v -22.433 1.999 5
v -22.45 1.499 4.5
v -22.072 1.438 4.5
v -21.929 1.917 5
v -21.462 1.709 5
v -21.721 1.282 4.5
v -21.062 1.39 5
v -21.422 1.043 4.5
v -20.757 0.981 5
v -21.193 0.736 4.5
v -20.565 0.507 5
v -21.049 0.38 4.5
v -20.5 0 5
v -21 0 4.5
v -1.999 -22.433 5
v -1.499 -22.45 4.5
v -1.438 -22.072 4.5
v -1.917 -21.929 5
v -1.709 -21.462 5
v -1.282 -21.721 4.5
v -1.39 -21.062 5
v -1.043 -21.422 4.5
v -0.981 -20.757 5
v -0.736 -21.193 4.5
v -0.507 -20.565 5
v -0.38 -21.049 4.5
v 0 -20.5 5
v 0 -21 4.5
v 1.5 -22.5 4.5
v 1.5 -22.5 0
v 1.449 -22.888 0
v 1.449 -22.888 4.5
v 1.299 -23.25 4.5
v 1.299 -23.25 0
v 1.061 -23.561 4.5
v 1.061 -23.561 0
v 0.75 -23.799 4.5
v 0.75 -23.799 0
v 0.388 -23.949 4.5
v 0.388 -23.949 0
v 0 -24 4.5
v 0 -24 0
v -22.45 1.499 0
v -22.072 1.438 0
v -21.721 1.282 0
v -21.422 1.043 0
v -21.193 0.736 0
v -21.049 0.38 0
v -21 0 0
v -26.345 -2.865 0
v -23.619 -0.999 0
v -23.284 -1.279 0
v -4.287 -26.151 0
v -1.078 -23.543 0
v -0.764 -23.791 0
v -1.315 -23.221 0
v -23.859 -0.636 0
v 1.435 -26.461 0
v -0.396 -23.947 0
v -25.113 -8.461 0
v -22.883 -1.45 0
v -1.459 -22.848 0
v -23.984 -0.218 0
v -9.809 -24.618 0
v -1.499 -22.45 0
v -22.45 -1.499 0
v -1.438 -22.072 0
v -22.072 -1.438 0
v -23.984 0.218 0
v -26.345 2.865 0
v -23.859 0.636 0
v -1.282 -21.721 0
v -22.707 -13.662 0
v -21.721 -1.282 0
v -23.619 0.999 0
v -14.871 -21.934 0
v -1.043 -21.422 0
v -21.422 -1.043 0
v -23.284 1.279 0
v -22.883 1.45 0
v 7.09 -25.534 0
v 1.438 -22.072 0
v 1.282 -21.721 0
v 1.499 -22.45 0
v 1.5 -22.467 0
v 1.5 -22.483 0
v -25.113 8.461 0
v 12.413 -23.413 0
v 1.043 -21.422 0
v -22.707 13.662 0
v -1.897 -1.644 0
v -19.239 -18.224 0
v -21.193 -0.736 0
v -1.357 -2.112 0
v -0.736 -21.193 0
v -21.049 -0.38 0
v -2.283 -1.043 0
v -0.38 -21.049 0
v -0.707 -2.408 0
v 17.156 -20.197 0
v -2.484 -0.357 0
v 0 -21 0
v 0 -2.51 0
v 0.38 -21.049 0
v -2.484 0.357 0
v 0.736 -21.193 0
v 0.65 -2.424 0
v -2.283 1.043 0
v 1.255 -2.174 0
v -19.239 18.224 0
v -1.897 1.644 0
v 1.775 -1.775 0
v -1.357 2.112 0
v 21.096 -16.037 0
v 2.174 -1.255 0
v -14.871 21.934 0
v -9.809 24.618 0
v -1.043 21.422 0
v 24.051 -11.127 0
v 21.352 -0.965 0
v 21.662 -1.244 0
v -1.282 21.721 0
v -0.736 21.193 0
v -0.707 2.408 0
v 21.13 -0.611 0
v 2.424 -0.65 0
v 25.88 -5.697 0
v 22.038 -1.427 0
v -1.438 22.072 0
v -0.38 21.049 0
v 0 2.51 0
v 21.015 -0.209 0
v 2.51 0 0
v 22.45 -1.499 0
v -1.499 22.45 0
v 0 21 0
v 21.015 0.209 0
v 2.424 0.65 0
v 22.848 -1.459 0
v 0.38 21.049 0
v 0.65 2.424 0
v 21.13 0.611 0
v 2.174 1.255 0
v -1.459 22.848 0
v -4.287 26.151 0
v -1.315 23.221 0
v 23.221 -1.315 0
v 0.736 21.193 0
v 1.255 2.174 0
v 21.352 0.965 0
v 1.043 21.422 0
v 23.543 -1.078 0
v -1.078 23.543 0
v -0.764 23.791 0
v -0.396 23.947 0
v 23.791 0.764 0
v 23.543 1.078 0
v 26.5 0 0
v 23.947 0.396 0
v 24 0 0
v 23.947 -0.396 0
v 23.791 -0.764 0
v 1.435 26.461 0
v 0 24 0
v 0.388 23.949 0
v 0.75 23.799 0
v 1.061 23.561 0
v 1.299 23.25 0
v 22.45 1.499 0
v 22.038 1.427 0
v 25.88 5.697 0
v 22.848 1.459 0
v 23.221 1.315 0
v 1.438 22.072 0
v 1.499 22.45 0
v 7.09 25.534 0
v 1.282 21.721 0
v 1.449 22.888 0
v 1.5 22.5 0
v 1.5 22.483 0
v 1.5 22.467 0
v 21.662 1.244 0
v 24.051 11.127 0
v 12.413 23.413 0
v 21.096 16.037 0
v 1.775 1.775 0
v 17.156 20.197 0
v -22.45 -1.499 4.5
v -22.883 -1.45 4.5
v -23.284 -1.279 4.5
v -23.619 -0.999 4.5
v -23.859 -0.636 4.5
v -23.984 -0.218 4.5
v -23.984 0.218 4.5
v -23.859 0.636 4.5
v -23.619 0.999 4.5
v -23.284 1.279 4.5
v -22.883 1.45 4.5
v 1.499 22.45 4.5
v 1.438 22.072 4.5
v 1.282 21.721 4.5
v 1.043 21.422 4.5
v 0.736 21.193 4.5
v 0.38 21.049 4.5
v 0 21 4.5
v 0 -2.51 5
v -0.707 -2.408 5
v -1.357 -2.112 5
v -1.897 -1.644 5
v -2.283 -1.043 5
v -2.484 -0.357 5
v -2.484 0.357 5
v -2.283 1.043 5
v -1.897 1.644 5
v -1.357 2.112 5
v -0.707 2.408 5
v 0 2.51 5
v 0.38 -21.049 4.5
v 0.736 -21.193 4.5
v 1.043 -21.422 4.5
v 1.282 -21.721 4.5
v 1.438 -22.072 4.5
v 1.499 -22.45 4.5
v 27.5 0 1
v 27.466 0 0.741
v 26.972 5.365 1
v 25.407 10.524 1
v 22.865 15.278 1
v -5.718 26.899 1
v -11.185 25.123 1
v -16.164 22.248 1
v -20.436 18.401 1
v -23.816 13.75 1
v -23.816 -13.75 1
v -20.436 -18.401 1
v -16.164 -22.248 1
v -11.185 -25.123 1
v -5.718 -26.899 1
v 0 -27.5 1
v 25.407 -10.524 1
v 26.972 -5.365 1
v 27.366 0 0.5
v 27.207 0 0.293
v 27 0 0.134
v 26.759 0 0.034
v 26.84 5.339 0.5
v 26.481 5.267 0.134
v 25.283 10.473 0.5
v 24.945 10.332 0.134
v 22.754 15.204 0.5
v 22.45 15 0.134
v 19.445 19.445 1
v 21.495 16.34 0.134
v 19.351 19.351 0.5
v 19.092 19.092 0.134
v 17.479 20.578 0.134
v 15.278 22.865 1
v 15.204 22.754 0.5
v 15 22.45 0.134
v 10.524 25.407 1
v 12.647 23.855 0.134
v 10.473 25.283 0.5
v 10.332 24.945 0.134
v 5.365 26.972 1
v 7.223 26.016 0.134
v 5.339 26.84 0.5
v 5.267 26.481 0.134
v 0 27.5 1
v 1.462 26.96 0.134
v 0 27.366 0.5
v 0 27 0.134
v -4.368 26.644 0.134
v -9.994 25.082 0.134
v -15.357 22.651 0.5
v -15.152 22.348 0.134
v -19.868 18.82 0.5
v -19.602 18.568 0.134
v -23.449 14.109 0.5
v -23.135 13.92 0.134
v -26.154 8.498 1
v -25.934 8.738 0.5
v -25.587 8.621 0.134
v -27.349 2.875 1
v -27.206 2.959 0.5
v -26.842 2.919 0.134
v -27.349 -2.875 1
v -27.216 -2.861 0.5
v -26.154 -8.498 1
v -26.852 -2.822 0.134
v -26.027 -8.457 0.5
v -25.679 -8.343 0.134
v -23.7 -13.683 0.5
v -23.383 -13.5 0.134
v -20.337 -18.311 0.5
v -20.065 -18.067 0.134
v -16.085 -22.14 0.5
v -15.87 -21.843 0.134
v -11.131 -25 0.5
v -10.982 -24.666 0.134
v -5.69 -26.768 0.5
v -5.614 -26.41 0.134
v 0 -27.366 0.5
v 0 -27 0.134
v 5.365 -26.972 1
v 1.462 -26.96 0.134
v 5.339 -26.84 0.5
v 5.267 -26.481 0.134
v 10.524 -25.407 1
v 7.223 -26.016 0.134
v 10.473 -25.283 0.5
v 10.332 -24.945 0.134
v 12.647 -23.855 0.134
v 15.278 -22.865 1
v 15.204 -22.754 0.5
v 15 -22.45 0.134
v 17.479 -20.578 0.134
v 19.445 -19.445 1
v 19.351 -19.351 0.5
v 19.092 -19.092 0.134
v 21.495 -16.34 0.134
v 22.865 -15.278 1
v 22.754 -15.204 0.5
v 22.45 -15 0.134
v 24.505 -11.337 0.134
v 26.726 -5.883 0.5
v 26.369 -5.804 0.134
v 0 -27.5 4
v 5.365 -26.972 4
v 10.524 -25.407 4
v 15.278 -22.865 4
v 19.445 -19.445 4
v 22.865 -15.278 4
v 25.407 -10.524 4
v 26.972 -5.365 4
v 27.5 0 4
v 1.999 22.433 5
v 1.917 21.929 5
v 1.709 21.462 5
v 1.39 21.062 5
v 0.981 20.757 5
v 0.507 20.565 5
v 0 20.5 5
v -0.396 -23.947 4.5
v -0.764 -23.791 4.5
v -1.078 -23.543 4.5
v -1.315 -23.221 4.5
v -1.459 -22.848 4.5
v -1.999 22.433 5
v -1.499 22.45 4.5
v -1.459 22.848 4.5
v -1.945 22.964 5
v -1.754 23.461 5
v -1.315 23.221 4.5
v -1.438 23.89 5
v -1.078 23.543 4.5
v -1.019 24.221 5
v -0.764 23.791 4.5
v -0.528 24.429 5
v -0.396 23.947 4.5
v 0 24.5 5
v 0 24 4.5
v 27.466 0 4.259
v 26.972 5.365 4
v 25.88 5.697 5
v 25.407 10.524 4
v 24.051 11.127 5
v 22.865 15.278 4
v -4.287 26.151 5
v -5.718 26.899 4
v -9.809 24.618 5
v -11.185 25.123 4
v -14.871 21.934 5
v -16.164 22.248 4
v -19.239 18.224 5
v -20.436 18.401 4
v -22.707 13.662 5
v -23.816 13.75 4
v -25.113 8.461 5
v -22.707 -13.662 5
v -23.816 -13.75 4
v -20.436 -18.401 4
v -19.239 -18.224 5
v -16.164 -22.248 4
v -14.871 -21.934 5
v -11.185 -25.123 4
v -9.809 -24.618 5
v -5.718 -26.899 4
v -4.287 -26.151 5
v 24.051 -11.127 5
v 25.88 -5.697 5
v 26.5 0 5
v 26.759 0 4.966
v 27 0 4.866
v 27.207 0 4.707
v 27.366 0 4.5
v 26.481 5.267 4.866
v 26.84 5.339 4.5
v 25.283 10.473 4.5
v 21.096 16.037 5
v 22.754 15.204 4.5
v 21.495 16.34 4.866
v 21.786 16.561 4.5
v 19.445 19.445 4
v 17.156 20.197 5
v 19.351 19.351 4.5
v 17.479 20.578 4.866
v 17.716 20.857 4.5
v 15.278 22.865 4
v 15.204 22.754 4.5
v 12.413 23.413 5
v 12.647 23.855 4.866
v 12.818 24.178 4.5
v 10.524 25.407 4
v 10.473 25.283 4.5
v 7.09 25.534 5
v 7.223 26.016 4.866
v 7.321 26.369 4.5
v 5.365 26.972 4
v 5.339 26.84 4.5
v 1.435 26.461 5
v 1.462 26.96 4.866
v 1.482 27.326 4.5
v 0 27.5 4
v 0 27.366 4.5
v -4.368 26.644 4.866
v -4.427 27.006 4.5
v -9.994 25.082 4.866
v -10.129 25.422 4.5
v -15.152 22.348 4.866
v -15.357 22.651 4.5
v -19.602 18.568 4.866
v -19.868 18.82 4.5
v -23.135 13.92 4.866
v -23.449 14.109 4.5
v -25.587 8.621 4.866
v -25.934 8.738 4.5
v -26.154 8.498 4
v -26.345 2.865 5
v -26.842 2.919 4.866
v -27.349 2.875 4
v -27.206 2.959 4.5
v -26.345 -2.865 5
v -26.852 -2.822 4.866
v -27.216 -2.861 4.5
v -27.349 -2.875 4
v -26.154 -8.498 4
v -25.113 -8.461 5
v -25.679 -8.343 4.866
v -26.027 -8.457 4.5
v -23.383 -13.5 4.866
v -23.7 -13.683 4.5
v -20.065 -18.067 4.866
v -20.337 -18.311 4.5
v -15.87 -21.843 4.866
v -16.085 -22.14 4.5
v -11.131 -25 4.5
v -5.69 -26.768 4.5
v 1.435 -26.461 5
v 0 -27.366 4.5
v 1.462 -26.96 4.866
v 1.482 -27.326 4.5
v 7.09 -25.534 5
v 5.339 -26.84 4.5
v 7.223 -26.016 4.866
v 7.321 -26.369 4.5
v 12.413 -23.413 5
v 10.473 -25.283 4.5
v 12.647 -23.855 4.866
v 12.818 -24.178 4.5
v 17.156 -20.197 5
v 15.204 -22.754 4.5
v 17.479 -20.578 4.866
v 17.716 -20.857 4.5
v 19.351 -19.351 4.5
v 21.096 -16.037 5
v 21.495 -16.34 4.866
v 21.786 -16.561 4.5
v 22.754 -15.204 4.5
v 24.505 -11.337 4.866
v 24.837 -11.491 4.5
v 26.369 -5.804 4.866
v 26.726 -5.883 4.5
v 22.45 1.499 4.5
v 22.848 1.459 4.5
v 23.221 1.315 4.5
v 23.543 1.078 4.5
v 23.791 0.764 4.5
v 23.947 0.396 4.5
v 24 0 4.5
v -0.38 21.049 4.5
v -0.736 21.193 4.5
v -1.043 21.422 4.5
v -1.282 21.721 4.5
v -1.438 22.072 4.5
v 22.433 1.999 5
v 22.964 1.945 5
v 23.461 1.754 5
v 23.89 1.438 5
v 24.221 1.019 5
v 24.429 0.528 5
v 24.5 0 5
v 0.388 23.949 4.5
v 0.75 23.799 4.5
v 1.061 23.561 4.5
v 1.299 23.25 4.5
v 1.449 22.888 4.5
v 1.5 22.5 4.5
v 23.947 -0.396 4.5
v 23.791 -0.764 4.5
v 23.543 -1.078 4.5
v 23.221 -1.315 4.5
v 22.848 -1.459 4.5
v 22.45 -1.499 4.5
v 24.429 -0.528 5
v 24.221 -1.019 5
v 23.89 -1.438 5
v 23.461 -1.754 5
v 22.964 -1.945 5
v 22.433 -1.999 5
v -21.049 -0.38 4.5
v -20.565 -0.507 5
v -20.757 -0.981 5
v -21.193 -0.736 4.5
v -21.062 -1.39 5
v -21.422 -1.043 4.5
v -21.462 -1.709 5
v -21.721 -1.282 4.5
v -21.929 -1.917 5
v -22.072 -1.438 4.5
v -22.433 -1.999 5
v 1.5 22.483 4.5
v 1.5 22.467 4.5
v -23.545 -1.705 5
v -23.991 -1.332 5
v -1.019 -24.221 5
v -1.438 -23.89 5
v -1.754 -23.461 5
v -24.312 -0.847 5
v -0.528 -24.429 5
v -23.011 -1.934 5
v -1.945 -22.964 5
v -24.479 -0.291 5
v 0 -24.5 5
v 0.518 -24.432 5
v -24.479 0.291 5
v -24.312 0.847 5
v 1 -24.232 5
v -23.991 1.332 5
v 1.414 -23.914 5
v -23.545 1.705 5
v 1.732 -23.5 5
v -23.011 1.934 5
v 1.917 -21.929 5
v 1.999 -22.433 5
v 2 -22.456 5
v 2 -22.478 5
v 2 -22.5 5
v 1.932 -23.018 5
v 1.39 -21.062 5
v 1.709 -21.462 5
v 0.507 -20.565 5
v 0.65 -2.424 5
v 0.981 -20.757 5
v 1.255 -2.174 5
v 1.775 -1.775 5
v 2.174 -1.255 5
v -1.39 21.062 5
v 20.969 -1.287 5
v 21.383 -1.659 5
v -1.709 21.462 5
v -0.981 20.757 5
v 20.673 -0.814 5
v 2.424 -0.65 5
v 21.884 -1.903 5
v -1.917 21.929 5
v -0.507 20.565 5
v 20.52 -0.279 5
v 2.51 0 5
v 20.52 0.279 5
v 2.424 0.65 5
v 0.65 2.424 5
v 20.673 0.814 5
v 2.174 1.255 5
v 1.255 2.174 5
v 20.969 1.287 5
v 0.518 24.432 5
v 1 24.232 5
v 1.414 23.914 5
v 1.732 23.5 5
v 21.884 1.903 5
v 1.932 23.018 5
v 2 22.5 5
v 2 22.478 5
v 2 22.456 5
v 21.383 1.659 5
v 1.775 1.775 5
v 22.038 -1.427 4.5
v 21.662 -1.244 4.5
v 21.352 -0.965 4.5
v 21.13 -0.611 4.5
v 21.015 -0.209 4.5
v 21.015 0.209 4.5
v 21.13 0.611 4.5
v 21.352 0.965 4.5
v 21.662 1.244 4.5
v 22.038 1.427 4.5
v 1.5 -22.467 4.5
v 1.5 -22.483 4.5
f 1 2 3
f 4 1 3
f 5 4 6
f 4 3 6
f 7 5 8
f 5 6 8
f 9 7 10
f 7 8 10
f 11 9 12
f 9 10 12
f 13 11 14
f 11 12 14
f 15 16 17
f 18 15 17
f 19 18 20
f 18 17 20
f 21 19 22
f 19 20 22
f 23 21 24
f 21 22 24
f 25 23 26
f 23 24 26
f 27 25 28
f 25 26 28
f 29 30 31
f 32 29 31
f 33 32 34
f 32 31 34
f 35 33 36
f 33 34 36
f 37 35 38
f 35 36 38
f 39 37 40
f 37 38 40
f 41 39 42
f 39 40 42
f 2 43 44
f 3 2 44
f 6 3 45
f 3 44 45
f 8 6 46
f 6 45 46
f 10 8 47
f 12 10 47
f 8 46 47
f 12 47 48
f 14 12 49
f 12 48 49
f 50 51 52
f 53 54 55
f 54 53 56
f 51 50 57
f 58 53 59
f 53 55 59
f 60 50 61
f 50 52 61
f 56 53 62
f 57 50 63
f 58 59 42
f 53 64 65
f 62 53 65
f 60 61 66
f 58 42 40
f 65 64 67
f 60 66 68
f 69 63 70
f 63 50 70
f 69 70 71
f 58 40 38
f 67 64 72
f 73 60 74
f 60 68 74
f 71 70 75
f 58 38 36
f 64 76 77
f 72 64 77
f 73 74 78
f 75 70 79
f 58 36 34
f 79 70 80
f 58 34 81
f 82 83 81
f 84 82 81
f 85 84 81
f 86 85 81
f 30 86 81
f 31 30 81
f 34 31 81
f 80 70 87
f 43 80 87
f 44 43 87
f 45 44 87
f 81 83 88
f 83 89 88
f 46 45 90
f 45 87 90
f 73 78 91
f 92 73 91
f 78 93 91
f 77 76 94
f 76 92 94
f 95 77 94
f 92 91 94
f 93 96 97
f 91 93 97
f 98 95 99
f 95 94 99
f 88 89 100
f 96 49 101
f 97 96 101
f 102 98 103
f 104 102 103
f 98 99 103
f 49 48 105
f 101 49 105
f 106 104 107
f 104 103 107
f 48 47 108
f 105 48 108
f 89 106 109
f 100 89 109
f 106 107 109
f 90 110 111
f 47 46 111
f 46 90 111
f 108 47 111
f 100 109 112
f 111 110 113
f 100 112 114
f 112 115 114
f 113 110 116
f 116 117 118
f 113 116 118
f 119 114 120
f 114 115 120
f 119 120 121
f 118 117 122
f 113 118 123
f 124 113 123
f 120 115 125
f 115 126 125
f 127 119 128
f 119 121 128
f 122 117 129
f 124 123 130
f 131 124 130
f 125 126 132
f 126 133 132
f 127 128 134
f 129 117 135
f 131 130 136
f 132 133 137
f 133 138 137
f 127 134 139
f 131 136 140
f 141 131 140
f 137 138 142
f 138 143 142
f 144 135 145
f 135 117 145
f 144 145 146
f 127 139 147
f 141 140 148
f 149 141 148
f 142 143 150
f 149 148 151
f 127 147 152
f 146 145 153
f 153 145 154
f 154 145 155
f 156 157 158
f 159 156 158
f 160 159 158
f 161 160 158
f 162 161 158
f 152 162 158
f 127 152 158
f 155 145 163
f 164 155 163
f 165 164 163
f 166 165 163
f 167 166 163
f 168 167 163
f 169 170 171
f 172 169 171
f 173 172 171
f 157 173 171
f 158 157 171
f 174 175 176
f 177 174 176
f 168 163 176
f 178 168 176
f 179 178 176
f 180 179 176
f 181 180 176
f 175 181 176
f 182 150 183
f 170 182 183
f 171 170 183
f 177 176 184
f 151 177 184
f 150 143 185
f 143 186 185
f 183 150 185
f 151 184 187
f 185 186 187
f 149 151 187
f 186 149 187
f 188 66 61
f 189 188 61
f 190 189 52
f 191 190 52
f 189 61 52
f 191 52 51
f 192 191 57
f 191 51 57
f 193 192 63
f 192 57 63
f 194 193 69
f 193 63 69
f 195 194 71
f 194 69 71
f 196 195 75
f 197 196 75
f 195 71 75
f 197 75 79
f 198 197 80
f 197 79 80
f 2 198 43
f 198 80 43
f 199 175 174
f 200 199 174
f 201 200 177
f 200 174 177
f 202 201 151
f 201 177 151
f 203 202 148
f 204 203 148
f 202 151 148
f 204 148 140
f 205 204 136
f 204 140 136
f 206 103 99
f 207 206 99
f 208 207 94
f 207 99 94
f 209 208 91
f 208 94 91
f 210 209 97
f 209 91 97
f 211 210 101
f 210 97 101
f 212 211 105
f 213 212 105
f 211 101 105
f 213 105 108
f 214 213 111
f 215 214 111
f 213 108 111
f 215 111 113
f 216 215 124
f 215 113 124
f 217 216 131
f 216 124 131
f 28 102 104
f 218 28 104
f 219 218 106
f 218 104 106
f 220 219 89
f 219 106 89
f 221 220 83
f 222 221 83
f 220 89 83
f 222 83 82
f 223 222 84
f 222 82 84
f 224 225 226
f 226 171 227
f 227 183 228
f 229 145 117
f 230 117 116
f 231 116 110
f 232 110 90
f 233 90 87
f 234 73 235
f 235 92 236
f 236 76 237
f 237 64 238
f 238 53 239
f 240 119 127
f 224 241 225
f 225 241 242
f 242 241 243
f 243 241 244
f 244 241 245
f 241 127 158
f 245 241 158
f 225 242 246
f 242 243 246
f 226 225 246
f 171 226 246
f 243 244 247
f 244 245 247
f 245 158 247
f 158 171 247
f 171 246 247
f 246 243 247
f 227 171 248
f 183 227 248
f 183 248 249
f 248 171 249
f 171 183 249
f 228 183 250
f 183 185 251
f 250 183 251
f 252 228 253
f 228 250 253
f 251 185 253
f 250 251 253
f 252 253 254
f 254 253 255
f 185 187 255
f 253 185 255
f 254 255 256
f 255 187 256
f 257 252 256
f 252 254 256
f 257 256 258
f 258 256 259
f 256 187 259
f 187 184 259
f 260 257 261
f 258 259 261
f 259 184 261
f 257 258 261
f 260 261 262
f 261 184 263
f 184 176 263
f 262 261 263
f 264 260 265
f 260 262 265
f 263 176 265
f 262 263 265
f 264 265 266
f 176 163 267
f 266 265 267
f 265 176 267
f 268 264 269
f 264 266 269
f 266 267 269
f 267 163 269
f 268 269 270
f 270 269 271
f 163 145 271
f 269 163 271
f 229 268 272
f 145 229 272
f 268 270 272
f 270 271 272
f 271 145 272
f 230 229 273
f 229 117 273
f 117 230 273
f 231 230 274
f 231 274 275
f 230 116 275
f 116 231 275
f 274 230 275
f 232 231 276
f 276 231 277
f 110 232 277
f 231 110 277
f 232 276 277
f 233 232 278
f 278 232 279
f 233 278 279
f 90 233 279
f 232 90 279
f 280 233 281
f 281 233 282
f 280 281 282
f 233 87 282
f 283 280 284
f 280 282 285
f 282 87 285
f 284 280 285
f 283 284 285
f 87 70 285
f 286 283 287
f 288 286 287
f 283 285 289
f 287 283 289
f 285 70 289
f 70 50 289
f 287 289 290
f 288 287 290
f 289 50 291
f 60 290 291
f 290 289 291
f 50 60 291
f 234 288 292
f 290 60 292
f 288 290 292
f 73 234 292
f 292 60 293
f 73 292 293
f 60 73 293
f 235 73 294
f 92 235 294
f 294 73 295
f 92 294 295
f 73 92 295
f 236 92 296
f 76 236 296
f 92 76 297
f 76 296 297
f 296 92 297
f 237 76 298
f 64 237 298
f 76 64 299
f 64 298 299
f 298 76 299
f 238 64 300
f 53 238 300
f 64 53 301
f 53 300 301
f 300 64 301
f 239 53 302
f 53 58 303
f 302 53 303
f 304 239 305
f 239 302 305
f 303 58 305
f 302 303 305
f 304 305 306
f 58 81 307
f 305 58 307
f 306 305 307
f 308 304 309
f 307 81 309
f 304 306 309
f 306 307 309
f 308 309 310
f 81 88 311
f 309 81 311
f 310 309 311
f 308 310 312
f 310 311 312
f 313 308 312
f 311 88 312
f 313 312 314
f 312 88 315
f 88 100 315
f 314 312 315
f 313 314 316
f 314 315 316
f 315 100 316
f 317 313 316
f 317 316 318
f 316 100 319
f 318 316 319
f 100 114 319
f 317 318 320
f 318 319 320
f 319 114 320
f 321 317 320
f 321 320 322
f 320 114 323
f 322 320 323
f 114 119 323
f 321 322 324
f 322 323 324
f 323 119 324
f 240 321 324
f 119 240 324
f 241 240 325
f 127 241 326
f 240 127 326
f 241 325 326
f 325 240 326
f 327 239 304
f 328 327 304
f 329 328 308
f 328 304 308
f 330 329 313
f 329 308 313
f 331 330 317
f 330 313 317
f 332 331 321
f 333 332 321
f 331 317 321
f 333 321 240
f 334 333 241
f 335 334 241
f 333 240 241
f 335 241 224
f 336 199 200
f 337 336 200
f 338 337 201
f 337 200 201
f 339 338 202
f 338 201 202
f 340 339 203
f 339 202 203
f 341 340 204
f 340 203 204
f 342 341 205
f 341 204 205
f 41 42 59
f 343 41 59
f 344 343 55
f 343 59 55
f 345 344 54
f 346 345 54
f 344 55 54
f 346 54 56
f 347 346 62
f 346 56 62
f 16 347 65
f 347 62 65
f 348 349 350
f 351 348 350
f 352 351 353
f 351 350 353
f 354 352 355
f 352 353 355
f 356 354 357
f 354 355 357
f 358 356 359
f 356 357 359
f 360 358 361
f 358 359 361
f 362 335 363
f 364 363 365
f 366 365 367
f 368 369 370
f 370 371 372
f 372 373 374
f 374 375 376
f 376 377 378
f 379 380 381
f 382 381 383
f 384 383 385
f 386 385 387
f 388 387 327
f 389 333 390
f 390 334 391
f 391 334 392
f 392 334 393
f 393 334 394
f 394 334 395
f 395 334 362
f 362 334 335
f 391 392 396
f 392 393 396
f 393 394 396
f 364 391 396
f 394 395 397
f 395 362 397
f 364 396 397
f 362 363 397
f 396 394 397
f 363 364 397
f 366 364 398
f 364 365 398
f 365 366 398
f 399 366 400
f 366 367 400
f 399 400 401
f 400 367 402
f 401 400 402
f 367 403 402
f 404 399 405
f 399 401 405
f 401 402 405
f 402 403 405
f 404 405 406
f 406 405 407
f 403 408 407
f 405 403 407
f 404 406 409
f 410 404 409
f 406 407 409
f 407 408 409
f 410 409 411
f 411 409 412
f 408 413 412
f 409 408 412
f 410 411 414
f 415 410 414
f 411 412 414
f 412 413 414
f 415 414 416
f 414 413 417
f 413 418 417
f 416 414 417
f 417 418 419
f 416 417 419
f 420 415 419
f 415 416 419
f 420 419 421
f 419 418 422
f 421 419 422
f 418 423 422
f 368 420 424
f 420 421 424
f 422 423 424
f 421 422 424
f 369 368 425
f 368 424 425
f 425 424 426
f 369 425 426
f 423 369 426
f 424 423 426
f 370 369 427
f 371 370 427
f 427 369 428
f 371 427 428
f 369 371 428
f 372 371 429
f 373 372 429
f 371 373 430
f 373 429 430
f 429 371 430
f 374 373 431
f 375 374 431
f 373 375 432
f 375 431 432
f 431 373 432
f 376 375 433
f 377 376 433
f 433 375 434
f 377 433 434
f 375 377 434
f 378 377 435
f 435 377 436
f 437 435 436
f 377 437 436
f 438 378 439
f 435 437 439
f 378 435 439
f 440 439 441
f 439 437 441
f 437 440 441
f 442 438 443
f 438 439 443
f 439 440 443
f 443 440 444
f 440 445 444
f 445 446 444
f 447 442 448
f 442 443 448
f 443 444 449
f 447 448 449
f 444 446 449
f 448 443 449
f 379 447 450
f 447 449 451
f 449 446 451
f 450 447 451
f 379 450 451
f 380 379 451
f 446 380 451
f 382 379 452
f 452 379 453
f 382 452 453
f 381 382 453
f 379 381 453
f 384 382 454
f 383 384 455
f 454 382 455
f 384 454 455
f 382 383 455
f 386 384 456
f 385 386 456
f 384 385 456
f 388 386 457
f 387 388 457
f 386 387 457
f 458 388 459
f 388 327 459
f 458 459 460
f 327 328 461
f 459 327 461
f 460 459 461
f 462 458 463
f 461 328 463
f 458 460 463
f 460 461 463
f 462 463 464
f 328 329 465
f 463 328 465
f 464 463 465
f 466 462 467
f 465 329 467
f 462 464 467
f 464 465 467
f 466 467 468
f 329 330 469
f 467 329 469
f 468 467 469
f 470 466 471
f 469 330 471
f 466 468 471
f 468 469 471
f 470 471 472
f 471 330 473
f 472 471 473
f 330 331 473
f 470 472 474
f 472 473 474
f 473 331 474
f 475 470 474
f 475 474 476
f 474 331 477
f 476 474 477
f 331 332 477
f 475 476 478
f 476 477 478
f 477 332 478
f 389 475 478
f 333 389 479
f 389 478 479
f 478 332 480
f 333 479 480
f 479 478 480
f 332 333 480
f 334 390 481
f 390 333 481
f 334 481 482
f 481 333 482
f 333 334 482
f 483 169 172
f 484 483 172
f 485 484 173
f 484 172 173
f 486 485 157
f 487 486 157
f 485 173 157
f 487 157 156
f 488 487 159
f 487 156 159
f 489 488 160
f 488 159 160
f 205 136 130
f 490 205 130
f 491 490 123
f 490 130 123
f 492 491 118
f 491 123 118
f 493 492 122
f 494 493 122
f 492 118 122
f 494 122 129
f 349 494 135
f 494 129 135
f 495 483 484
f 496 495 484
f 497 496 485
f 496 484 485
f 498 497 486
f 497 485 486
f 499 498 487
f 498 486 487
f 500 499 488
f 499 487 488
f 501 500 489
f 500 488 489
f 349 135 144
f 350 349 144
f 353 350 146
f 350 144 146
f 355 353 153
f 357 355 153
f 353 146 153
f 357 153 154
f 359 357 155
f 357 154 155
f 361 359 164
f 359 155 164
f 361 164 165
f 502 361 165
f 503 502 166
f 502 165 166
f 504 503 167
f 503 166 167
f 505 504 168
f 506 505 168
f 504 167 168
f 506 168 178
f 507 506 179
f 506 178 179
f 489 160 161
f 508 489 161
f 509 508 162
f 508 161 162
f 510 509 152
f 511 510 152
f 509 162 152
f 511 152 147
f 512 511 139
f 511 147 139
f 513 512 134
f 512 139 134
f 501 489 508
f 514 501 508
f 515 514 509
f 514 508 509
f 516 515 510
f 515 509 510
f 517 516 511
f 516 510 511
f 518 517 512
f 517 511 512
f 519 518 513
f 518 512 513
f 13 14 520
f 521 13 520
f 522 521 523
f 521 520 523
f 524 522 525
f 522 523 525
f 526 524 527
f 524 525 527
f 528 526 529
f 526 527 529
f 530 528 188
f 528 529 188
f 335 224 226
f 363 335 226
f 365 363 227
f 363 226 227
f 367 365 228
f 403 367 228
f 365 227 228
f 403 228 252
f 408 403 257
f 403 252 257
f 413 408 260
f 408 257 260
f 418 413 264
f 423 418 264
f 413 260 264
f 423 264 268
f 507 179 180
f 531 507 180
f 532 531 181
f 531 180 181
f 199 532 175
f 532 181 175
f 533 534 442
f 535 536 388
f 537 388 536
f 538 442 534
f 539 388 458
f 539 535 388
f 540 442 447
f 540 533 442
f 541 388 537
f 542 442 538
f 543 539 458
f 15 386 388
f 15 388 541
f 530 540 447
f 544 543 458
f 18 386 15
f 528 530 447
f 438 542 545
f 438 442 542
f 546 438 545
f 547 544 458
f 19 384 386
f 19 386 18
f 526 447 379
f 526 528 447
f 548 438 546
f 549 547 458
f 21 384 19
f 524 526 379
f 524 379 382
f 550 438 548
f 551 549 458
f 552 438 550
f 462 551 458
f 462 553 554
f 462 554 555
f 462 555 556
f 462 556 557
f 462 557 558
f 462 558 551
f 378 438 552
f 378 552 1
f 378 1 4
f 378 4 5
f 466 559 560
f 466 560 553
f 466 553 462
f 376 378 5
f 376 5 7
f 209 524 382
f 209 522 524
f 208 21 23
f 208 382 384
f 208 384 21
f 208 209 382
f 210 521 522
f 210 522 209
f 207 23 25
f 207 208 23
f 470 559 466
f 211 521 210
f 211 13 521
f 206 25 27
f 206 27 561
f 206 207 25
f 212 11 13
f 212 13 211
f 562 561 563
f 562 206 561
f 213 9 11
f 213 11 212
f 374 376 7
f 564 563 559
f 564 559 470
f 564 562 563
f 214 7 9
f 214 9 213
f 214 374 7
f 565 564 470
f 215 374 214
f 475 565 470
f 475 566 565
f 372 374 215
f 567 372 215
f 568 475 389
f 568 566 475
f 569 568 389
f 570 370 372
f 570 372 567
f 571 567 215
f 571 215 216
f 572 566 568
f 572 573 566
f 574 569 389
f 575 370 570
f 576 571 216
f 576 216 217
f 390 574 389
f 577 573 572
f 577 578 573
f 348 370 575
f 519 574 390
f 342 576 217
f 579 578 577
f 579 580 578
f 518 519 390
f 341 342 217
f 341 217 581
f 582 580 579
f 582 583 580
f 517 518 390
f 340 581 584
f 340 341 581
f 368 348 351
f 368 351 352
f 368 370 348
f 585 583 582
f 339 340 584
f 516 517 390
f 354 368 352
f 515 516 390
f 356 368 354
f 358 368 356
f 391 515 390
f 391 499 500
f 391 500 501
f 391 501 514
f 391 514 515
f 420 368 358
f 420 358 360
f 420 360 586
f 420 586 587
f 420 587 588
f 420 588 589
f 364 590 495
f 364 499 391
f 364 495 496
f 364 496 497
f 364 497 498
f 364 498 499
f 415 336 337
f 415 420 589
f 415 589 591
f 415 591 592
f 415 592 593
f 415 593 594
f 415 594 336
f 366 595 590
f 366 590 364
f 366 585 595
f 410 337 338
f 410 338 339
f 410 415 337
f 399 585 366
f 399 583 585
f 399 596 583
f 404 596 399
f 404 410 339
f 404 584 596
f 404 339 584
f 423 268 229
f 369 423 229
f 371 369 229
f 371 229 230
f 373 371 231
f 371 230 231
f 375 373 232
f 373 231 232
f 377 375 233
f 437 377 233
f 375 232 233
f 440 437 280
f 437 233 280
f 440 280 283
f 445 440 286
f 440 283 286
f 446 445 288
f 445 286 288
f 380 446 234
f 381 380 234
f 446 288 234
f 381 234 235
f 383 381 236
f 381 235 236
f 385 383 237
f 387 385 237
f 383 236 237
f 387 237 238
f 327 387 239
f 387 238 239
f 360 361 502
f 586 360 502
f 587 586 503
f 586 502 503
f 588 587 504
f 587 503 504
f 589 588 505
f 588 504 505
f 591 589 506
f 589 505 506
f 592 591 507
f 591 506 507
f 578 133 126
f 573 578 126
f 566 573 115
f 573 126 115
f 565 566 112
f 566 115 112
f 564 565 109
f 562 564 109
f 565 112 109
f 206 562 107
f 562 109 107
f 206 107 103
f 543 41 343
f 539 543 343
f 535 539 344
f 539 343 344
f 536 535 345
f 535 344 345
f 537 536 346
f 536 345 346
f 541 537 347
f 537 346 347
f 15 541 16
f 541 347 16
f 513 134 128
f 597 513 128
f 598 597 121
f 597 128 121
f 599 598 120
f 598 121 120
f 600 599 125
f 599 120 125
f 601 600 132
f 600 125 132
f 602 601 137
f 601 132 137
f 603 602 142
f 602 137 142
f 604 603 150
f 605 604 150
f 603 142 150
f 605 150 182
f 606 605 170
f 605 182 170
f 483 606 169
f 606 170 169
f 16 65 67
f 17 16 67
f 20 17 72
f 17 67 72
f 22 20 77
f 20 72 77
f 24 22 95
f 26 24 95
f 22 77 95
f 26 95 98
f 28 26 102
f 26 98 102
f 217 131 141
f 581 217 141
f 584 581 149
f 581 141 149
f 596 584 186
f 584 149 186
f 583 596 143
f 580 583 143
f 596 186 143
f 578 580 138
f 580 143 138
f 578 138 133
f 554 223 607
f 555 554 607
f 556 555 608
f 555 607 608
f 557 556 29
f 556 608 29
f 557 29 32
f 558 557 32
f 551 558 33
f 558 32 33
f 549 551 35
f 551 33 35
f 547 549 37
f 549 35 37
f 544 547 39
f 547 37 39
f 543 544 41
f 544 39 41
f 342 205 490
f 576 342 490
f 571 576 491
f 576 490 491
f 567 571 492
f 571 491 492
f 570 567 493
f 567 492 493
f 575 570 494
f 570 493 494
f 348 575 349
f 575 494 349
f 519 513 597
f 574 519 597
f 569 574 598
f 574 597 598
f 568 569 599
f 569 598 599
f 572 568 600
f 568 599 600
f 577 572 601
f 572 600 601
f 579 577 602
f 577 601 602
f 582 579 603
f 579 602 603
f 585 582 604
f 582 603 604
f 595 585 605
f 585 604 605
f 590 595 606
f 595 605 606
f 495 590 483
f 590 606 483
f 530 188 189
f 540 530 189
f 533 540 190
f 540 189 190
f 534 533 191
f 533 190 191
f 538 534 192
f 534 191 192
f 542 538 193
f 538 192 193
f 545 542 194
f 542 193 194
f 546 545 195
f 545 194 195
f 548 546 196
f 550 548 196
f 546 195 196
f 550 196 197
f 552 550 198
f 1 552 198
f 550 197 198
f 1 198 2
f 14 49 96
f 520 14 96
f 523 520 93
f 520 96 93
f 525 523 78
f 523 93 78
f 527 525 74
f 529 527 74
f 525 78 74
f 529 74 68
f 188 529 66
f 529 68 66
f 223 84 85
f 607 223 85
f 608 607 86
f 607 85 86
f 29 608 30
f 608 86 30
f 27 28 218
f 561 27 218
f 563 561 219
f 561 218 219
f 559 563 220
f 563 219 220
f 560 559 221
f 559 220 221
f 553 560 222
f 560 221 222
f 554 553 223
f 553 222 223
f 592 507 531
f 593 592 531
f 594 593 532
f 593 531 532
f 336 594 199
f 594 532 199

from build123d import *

# Parameters (mm, degrees)
ESQUISSE1_R        = 27.5
ESQUISSE1_R_2      = 1.5
ESQUISSE1_R_3      = 2.51
BOSS_EXTRU_2_DEPTH = 5
CONG_1_R           = 1
CHANFREIN1_SIZE    = 0.5


with BuildPart() as part:
    # Esquisse1 → Boss.-Extru.2 (new body)
    with BuildSketch(Plane.XY):
        Circle(ESQUISSE1_R)
        with Locations((0, -22.5)):
            Circle(ESQUISSE1_R_2, mode=Mode.SUBTRACT)
        with Locations((22.5, 0)):
            Circle(ESQUISSE1_R_2, mode=Mode.SUBTRACT)
        with Locations((0, 22.5)):
            Circle(ESQUISSE1_R_2, mode=Mode.SUBTRACT)
        with Locations((-22.5, 0)):
            Circle(ESQUISSE1_R_2, mode=Mode.SUBTRACT)
        Circle(ESQUISSE1_R_3, mode=Mode.SUBTRACT)
    extrude(amount=BOSS_EXTRU_2_DEPTH)

    # Congé1
    cong_1_edges = [part.edges().sort_by_distance(p)[0] for p in [
        (-27.5, 0, 5),
        (-27.5, 0, 0),
    ]]
    fillet(cong_1_edges, radius=CONG_1_R)

    # Chanfrein1
    chanfrein1_edges = [part.edges().sort_by_distance(p)[0] for p in [
        (21, 0, 5),
        (-1.5, -22.5, 5),
        (-24, 0, 5),
        (-1.5, 22.5, 5),
    ]]
    chamfer(chanfrein1_edges, length=CHANFREIN1_SIZE)


solid = part.part
